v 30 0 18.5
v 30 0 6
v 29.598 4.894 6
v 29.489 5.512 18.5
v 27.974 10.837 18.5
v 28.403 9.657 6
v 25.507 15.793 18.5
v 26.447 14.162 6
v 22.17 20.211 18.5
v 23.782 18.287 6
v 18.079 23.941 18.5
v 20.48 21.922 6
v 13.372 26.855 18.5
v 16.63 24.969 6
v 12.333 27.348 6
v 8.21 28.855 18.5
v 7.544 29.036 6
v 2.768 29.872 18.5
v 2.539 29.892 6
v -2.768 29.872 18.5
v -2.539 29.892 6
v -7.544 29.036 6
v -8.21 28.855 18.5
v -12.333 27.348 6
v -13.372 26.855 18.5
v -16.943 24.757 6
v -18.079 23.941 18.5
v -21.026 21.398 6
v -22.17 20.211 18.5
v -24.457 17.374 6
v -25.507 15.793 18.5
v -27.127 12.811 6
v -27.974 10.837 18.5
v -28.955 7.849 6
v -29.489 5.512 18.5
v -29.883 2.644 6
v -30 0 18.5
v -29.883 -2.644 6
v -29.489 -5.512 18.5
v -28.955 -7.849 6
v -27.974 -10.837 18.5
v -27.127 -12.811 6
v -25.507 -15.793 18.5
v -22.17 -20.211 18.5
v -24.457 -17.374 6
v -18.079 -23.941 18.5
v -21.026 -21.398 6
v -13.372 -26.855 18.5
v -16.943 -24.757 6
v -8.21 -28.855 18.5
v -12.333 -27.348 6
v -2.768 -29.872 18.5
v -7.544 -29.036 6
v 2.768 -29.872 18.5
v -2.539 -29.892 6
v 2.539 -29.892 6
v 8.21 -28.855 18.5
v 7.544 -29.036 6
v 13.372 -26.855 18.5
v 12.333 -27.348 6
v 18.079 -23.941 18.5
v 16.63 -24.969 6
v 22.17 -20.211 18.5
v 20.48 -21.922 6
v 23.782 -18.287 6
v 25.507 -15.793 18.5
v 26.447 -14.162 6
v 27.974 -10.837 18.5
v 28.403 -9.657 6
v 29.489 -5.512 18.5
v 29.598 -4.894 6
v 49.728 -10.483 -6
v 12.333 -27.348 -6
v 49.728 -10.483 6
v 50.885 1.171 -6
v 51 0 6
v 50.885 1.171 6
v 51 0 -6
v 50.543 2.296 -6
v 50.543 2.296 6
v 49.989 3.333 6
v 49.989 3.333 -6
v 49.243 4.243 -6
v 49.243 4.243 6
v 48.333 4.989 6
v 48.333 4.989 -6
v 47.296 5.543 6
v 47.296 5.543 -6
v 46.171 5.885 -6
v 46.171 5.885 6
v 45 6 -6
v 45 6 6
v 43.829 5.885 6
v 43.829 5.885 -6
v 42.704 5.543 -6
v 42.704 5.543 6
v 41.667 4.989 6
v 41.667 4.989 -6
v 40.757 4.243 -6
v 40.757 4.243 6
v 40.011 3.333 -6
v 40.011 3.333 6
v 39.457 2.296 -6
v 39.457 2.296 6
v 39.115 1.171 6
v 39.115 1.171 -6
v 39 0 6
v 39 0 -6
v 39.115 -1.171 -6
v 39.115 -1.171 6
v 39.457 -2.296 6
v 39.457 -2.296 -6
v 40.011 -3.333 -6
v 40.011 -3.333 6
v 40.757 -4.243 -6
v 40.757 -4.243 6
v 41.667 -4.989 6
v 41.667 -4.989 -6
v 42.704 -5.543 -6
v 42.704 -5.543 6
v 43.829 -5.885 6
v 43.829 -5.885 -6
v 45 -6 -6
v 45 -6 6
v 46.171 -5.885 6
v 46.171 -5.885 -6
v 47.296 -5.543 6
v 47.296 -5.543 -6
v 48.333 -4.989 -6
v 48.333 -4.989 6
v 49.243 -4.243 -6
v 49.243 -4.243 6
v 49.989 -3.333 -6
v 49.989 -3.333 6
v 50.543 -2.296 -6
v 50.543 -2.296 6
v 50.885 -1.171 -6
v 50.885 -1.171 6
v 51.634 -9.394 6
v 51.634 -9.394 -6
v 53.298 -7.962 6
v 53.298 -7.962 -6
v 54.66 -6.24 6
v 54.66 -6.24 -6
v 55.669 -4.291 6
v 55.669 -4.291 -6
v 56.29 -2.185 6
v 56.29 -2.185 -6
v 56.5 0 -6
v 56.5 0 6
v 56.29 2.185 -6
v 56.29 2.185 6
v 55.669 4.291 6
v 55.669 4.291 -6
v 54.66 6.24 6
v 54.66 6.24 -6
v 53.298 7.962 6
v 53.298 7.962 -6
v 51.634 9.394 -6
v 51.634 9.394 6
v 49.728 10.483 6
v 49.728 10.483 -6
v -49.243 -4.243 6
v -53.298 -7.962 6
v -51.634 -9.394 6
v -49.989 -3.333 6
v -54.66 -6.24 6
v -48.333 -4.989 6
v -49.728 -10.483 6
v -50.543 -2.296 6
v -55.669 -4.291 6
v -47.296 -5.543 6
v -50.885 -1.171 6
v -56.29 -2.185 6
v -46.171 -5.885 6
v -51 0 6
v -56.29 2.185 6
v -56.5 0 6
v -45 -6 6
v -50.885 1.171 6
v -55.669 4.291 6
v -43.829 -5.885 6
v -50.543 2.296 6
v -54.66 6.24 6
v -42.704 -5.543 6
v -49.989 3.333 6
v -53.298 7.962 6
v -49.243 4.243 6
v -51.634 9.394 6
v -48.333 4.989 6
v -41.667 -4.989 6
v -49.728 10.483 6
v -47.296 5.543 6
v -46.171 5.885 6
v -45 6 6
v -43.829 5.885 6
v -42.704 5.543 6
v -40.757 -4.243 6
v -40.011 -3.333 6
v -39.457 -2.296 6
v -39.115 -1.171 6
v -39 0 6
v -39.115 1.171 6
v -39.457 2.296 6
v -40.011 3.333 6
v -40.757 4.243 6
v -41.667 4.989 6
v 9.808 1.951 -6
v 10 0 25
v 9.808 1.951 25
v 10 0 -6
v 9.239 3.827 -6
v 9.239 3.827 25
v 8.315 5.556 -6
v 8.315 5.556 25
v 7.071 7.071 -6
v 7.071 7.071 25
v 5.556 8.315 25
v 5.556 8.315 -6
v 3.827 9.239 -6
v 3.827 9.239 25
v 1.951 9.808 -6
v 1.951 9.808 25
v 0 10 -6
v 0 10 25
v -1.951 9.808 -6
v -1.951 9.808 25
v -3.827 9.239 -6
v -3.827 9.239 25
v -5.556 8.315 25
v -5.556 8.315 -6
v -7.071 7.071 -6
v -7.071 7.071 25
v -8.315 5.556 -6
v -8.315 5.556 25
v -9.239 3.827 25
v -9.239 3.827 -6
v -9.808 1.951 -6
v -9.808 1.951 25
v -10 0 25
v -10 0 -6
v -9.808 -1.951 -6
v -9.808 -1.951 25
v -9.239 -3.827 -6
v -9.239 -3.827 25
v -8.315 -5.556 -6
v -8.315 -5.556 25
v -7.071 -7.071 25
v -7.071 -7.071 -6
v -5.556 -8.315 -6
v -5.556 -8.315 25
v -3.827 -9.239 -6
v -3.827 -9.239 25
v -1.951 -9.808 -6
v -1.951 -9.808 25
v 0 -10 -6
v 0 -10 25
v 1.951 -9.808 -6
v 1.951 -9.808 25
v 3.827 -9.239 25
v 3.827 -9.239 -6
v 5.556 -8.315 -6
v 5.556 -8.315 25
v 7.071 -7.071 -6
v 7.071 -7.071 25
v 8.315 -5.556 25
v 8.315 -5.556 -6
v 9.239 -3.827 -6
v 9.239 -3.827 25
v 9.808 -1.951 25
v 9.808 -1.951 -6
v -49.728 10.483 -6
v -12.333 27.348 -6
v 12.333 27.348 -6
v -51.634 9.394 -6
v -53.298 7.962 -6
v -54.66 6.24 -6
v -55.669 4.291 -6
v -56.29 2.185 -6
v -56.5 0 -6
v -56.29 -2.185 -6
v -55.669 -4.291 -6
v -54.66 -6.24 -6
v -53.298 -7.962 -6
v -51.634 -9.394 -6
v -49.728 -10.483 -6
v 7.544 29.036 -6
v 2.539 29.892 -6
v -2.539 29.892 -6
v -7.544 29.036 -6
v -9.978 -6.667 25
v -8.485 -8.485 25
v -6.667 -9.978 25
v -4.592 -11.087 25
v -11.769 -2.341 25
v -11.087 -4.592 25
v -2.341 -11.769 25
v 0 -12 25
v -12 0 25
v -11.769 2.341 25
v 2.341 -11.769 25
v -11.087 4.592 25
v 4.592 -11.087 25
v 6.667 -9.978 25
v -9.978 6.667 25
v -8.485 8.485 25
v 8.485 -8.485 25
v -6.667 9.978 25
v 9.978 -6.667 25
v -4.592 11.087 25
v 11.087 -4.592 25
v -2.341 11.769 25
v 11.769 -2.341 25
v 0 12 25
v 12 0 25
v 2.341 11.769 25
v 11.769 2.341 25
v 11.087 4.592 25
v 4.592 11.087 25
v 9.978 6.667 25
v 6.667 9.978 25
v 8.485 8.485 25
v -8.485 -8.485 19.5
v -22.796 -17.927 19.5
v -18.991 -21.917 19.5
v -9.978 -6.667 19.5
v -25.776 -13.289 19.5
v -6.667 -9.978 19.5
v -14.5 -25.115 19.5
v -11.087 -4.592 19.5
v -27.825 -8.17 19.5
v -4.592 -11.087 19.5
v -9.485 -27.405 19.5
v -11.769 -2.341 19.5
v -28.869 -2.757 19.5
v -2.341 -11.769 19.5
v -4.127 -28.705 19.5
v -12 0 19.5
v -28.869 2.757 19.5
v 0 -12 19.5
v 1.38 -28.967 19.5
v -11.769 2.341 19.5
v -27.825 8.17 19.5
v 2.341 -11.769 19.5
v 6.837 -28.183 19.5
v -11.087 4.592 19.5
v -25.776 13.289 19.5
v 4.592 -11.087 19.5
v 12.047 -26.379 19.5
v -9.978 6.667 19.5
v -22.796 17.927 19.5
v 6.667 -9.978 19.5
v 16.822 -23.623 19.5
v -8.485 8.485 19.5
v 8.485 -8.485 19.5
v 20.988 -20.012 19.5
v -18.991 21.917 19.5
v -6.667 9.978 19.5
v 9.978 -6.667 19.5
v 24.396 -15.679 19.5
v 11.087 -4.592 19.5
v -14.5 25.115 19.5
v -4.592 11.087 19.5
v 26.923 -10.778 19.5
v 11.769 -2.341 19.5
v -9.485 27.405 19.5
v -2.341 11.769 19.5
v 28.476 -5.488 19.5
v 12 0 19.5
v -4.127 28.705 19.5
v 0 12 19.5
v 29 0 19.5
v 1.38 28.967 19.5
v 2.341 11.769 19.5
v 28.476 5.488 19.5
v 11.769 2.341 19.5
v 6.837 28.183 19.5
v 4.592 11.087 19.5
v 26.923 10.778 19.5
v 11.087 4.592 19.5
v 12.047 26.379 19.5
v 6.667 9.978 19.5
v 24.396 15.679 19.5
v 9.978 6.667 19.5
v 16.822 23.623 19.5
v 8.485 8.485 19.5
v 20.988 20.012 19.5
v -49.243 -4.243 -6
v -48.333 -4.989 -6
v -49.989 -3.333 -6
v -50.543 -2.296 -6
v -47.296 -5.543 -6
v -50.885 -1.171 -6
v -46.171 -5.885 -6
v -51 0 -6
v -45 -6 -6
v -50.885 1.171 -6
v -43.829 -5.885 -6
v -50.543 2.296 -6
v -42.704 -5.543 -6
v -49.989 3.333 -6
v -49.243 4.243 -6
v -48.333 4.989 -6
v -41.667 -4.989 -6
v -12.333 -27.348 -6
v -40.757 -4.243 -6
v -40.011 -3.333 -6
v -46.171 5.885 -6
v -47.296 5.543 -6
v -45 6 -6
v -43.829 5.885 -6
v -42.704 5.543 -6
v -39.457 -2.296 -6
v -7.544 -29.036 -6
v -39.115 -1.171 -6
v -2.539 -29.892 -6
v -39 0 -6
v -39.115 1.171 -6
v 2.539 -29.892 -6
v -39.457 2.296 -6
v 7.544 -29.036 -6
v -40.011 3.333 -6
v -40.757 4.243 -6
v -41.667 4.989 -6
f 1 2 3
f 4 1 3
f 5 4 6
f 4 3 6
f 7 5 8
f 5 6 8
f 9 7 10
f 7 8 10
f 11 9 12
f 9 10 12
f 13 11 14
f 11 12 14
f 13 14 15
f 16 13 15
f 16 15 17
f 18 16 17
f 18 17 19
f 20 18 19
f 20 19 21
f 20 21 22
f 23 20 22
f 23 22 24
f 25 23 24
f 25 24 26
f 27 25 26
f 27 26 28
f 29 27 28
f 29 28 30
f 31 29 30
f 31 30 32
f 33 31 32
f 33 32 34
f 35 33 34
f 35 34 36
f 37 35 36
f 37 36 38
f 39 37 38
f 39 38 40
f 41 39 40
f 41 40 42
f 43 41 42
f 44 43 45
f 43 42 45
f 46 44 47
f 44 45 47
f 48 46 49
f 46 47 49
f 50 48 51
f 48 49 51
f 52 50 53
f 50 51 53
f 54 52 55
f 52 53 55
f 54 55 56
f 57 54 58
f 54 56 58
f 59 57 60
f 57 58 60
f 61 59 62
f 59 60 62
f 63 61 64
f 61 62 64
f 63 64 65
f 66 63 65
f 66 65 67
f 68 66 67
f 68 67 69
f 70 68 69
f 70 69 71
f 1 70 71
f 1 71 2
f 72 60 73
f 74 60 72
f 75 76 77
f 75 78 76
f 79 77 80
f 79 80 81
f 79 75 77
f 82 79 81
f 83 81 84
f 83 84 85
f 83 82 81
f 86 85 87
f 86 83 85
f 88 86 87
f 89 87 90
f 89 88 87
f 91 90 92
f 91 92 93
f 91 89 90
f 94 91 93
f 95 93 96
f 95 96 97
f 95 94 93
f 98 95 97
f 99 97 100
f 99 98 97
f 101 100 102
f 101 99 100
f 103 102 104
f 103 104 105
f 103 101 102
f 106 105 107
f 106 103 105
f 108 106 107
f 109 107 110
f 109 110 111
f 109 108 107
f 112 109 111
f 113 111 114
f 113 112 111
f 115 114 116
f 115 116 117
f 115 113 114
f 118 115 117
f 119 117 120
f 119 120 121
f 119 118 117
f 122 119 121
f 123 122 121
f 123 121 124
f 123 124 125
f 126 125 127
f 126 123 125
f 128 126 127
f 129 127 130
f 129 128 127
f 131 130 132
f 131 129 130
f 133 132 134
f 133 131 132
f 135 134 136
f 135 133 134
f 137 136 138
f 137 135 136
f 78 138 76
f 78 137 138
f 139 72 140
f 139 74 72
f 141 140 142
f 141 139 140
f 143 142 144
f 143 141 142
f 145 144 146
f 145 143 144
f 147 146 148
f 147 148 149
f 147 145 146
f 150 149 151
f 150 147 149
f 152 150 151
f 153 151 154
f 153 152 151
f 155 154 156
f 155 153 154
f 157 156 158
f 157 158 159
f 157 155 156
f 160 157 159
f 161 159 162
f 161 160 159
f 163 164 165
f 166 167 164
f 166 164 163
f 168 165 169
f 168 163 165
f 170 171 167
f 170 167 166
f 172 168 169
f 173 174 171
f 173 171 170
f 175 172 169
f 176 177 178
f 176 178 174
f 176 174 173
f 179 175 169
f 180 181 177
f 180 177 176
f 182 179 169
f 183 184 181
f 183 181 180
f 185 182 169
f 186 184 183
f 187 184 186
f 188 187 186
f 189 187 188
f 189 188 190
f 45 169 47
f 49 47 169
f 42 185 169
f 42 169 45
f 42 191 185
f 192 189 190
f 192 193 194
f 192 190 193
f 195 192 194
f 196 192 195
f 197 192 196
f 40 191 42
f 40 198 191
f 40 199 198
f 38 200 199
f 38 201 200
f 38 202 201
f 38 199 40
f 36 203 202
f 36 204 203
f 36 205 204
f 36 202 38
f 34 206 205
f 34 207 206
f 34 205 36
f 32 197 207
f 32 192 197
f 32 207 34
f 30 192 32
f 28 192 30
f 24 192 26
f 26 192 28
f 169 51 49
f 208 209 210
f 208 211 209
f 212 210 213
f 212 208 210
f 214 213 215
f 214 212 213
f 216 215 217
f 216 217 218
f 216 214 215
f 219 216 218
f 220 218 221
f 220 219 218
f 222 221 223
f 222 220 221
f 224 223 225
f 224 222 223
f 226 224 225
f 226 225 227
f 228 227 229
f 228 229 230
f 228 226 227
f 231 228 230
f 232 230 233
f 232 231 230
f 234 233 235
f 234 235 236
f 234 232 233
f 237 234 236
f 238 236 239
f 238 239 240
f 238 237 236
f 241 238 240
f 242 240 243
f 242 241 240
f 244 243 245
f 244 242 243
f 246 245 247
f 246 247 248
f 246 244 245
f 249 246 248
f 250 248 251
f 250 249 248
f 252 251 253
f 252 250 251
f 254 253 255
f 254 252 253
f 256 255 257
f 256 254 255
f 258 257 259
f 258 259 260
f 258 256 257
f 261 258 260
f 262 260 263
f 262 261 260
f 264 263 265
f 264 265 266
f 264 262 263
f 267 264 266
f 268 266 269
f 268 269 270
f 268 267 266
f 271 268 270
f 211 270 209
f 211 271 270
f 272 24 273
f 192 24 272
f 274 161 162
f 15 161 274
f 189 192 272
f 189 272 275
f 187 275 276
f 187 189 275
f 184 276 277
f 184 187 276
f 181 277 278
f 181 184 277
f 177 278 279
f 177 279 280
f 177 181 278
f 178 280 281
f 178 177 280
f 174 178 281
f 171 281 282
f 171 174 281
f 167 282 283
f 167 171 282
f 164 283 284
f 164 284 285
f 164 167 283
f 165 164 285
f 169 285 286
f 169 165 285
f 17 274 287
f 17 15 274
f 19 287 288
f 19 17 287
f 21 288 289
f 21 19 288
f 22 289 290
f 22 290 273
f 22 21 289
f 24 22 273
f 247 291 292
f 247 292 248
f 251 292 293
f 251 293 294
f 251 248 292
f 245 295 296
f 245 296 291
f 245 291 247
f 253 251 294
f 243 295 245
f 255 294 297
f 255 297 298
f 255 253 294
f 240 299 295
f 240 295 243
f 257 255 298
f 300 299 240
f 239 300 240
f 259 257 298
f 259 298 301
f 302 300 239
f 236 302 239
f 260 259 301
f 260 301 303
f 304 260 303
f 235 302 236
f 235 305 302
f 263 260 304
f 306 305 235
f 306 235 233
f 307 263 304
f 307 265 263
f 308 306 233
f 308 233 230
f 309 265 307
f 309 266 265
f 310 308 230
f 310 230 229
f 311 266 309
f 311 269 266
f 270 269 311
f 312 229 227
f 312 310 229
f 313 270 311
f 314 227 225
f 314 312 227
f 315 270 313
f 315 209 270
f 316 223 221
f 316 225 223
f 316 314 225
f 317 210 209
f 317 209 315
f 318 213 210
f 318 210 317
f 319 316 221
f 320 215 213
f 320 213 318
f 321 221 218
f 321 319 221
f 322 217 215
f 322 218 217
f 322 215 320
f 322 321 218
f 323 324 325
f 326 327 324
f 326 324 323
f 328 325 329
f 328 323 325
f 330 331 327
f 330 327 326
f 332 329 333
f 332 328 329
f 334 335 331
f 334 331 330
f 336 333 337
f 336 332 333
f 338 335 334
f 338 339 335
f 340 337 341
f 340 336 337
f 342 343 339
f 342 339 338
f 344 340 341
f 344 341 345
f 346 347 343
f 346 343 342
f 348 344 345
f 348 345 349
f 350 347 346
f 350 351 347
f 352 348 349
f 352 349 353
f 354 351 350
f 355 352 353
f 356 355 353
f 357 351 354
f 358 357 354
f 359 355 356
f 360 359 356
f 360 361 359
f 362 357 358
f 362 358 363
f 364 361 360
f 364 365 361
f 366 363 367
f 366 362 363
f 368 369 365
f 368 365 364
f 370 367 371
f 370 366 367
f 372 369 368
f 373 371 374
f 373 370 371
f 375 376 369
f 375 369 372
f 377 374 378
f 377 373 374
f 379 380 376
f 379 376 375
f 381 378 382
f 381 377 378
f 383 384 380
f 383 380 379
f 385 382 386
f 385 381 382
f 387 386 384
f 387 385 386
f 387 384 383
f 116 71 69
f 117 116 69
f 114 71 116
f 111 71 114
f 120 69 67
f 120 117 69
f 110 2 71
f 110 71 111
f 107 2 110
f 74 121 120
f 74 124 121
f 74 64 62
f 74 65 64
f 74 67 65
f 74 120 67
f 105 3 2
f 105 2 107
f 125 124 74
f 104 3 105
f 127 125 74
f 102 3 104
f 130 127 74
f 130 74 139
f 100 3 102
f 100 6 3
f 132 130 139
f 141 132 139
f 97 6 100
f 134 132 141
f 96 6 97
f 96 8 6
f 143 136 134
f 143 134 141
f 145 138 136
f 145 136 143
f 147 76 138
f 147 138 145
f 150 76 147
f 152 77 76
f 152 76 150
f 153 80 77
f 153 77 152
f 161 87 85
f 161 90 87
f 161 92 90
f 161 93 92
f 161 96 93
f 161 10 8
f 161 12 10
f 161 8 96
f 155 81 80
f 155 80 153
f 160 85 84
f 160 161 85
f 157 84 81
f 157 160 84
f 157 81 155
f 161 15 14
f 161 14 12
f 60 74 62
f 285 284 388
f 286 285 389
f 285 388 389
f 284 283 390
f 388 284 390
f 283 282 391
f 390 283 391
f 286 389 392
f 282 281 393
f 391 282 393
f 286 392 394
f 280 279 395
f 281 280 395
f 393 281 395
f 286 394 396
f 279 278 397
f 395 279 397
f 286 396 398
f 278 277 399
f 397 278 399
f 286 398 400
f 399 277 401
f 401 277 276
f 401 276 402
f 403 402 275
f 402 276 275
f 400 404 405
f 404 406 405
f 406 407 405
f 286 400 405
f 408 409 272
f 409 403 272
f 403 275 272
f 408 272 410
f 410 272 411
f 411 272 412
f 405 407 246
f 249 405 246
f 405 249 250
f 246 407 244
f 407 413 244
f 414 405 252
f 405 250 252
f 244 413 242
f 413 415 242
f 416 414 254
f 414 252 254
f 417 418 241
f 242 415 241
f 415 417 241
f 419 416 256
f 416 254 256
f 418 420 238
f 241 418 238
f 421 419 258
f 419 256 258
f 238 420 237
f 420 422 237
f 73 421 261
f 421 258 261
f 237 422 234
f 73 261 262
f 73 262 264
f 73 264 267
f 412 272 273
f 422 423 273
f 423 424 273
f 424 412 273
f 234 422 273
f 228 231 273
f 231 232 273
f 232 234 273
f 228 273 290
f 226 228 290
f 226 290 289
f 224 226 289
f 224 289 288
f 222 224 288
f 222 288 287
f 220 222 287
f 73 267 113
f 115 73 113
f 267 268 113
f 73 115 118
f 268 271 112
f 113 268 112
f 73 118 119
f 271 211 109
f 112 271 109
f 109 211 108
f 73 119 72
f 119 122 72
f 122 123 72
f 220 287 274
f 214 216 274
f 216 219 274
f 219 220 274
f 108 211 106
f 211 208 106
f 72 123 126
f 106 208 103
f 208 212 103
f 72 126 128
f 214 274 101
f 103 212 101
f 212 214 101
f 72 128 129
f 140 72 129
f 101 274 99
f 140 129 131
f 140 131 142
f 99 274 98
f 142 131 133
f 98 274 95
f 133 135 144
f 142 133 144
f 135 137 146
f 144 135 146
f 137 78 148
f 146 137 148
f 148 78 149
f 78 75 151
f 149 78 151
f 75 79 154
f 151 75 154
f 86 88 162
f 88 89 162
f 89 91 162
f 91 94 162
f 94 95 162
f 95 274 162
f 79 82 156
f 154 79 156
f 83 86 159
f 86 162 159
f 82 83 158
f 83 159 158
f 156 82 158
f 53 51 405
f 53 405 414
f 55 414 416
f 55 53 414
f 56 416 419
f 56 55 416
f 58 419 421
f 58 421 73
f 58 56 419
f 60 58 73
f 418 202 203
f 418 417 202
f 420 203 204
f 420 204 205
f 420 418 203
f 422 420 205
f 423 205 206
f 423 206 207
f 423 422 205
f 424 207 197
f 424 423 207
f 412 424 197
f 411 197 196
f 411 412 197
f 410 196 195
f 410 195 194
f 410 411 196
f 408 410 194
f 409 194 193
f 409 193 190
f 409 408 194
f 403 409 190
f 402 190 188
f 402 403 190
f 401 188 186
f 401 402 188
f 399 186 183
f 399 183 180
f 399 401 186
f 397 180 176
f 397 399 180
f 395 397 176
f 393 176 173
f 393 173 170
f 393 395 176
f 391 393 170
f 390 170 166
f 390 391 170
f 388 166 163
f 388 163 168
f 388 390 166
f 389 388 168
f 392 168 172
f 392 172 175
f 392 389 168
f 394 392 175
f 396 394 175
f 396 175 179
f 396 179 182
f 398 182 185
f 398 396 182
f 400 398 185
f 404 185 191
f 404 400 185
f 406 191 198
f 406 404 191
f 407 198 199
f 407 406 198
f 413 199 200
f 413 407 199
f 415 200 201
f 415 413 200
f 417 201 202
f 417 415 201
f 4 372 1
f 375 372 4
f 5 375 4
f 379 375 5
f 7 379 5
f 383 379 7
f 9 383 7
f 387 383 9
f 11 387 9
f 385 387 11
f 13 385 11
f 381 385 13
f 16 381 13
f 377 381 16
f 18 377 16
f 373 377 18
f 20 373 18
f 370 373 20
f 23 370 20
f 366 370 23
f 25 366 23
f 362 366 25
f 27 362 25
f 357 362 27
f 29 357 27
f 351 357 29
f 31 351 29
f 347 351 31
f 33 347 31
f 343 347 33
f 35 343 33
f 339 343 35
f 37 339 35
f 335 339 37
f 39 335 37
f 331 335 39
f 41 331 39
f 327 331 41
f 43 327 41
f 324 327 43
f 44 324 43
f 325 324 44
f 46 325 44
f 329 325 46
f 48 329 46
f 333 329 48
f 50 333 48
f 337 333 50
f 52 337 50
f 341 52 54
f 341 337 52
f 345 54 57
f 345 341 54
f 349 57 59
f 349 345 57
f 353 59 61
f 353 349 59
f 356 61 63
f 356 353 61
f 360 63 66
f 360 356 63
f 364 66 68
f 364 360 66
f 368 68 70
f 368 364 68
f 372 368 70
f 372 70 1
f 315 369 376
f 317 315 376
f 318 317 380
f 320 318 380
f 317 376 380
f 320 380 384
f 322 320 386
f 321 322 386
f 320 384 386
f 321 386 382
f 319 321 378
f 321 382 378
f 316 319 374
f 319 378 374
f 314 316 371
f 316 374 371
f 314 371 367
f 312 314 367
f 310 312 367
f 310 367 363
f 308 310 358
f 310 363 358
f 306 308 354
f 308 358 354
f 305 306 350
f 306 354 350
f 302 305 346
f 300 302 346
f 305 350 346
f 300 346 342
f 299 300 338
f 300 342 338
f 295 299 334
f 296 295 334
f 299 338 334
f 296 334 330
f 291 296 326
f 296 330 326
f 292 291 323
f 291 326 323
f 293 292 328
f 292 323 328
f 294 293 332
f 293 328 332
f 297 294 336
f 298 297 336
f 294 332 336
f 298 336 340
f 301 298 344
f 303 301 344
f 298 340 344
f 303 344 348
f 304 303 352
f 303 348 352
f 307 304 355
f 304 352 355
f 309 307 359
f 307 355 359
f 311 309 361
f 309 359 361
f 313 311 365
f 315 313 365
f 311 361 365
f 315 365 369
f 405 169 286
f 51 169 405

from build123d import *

# Parameters (mm, degrees)
F0_R     = 6
F0_R_2   = 10
F1_DEPTH = 6
F2_R     = 30
F2_R_2   = 10
F3_DEPTH = 13.5
F4_R     = 12
F4_R_2   = 10
F5_DEPTH = 5.5
F6_SIZE  = 1


with BuildPart() as f1:
    # F0 (on Top) → F1 (new body, symmetric)
    with BuildSketch(Plane.XY):
        with BuildLine():
            Line((-12.3333333333, 27.3475572746), (-49.7277777778, 10.4832302886))
            ThreePointArc((-49.7277777778, 10.4832302886), (-56.5, 0), (-49.7277777778, -10.4832302886))
            Line((-49.7277777778, -10.4832302886), (-12.3333333333, -27.3475572746))
            ThreePointArc((-12.3333333333, -27.3475572746), (0, -30), (12.3333333333, -27.3475572746))
            Line((12.3333333333, -27.3475572746), (49.7277777778, -10.4832302886))
            ThreePointArc((49.7277777778, -10.4832302886), (56.5, 0), (49.7277777778, 10.4832302886))
            Line((49.7277777778, 10.4832302886), (12.3333333333, 27.3475572746))
            ThreePointArc((12.3333333333, 27.3475572746), (0, 30), (-12.3333333333, 27.3475572746))
        make_face()
        with Locations((-45, 0)):
            Circle(F0_R, mode=Mode.SUBTRACT)
        Circle(F0_R_2, mode=Mode.SUBTRACT)
        with Locations((45, 0)):
            Circle(F0_R, mode=Mode.SUBTRACT)
    extrude(amount=F1_DEPTH, both=True)

    # F2 (on face) → F3 (join)
    with BuildSketch(Plane.XY.offset(6)):
        Circle(F2_R)
        Circle(F2_R_2, mode=Mode.SUBTRACT)
    extrude(amount=F3_DEPTH)

    # F4 (on face) → F5 (join)
    with BuildSketch(Plane.XY.offset(19.5)):
        Circle(F4_R)
        Circle(F4_R_2, mode=Mode.SUBTRACT)
    extrude(amount=F5_DEPTH)

    # F6
    f6_edges = [f1.edges().sort_by_distance(p)[0] for p in [
        (-30, 0, 19.5),
    ]]
    chamfer(f6_edges, length=F6_SIZE)


solid = f1.part
